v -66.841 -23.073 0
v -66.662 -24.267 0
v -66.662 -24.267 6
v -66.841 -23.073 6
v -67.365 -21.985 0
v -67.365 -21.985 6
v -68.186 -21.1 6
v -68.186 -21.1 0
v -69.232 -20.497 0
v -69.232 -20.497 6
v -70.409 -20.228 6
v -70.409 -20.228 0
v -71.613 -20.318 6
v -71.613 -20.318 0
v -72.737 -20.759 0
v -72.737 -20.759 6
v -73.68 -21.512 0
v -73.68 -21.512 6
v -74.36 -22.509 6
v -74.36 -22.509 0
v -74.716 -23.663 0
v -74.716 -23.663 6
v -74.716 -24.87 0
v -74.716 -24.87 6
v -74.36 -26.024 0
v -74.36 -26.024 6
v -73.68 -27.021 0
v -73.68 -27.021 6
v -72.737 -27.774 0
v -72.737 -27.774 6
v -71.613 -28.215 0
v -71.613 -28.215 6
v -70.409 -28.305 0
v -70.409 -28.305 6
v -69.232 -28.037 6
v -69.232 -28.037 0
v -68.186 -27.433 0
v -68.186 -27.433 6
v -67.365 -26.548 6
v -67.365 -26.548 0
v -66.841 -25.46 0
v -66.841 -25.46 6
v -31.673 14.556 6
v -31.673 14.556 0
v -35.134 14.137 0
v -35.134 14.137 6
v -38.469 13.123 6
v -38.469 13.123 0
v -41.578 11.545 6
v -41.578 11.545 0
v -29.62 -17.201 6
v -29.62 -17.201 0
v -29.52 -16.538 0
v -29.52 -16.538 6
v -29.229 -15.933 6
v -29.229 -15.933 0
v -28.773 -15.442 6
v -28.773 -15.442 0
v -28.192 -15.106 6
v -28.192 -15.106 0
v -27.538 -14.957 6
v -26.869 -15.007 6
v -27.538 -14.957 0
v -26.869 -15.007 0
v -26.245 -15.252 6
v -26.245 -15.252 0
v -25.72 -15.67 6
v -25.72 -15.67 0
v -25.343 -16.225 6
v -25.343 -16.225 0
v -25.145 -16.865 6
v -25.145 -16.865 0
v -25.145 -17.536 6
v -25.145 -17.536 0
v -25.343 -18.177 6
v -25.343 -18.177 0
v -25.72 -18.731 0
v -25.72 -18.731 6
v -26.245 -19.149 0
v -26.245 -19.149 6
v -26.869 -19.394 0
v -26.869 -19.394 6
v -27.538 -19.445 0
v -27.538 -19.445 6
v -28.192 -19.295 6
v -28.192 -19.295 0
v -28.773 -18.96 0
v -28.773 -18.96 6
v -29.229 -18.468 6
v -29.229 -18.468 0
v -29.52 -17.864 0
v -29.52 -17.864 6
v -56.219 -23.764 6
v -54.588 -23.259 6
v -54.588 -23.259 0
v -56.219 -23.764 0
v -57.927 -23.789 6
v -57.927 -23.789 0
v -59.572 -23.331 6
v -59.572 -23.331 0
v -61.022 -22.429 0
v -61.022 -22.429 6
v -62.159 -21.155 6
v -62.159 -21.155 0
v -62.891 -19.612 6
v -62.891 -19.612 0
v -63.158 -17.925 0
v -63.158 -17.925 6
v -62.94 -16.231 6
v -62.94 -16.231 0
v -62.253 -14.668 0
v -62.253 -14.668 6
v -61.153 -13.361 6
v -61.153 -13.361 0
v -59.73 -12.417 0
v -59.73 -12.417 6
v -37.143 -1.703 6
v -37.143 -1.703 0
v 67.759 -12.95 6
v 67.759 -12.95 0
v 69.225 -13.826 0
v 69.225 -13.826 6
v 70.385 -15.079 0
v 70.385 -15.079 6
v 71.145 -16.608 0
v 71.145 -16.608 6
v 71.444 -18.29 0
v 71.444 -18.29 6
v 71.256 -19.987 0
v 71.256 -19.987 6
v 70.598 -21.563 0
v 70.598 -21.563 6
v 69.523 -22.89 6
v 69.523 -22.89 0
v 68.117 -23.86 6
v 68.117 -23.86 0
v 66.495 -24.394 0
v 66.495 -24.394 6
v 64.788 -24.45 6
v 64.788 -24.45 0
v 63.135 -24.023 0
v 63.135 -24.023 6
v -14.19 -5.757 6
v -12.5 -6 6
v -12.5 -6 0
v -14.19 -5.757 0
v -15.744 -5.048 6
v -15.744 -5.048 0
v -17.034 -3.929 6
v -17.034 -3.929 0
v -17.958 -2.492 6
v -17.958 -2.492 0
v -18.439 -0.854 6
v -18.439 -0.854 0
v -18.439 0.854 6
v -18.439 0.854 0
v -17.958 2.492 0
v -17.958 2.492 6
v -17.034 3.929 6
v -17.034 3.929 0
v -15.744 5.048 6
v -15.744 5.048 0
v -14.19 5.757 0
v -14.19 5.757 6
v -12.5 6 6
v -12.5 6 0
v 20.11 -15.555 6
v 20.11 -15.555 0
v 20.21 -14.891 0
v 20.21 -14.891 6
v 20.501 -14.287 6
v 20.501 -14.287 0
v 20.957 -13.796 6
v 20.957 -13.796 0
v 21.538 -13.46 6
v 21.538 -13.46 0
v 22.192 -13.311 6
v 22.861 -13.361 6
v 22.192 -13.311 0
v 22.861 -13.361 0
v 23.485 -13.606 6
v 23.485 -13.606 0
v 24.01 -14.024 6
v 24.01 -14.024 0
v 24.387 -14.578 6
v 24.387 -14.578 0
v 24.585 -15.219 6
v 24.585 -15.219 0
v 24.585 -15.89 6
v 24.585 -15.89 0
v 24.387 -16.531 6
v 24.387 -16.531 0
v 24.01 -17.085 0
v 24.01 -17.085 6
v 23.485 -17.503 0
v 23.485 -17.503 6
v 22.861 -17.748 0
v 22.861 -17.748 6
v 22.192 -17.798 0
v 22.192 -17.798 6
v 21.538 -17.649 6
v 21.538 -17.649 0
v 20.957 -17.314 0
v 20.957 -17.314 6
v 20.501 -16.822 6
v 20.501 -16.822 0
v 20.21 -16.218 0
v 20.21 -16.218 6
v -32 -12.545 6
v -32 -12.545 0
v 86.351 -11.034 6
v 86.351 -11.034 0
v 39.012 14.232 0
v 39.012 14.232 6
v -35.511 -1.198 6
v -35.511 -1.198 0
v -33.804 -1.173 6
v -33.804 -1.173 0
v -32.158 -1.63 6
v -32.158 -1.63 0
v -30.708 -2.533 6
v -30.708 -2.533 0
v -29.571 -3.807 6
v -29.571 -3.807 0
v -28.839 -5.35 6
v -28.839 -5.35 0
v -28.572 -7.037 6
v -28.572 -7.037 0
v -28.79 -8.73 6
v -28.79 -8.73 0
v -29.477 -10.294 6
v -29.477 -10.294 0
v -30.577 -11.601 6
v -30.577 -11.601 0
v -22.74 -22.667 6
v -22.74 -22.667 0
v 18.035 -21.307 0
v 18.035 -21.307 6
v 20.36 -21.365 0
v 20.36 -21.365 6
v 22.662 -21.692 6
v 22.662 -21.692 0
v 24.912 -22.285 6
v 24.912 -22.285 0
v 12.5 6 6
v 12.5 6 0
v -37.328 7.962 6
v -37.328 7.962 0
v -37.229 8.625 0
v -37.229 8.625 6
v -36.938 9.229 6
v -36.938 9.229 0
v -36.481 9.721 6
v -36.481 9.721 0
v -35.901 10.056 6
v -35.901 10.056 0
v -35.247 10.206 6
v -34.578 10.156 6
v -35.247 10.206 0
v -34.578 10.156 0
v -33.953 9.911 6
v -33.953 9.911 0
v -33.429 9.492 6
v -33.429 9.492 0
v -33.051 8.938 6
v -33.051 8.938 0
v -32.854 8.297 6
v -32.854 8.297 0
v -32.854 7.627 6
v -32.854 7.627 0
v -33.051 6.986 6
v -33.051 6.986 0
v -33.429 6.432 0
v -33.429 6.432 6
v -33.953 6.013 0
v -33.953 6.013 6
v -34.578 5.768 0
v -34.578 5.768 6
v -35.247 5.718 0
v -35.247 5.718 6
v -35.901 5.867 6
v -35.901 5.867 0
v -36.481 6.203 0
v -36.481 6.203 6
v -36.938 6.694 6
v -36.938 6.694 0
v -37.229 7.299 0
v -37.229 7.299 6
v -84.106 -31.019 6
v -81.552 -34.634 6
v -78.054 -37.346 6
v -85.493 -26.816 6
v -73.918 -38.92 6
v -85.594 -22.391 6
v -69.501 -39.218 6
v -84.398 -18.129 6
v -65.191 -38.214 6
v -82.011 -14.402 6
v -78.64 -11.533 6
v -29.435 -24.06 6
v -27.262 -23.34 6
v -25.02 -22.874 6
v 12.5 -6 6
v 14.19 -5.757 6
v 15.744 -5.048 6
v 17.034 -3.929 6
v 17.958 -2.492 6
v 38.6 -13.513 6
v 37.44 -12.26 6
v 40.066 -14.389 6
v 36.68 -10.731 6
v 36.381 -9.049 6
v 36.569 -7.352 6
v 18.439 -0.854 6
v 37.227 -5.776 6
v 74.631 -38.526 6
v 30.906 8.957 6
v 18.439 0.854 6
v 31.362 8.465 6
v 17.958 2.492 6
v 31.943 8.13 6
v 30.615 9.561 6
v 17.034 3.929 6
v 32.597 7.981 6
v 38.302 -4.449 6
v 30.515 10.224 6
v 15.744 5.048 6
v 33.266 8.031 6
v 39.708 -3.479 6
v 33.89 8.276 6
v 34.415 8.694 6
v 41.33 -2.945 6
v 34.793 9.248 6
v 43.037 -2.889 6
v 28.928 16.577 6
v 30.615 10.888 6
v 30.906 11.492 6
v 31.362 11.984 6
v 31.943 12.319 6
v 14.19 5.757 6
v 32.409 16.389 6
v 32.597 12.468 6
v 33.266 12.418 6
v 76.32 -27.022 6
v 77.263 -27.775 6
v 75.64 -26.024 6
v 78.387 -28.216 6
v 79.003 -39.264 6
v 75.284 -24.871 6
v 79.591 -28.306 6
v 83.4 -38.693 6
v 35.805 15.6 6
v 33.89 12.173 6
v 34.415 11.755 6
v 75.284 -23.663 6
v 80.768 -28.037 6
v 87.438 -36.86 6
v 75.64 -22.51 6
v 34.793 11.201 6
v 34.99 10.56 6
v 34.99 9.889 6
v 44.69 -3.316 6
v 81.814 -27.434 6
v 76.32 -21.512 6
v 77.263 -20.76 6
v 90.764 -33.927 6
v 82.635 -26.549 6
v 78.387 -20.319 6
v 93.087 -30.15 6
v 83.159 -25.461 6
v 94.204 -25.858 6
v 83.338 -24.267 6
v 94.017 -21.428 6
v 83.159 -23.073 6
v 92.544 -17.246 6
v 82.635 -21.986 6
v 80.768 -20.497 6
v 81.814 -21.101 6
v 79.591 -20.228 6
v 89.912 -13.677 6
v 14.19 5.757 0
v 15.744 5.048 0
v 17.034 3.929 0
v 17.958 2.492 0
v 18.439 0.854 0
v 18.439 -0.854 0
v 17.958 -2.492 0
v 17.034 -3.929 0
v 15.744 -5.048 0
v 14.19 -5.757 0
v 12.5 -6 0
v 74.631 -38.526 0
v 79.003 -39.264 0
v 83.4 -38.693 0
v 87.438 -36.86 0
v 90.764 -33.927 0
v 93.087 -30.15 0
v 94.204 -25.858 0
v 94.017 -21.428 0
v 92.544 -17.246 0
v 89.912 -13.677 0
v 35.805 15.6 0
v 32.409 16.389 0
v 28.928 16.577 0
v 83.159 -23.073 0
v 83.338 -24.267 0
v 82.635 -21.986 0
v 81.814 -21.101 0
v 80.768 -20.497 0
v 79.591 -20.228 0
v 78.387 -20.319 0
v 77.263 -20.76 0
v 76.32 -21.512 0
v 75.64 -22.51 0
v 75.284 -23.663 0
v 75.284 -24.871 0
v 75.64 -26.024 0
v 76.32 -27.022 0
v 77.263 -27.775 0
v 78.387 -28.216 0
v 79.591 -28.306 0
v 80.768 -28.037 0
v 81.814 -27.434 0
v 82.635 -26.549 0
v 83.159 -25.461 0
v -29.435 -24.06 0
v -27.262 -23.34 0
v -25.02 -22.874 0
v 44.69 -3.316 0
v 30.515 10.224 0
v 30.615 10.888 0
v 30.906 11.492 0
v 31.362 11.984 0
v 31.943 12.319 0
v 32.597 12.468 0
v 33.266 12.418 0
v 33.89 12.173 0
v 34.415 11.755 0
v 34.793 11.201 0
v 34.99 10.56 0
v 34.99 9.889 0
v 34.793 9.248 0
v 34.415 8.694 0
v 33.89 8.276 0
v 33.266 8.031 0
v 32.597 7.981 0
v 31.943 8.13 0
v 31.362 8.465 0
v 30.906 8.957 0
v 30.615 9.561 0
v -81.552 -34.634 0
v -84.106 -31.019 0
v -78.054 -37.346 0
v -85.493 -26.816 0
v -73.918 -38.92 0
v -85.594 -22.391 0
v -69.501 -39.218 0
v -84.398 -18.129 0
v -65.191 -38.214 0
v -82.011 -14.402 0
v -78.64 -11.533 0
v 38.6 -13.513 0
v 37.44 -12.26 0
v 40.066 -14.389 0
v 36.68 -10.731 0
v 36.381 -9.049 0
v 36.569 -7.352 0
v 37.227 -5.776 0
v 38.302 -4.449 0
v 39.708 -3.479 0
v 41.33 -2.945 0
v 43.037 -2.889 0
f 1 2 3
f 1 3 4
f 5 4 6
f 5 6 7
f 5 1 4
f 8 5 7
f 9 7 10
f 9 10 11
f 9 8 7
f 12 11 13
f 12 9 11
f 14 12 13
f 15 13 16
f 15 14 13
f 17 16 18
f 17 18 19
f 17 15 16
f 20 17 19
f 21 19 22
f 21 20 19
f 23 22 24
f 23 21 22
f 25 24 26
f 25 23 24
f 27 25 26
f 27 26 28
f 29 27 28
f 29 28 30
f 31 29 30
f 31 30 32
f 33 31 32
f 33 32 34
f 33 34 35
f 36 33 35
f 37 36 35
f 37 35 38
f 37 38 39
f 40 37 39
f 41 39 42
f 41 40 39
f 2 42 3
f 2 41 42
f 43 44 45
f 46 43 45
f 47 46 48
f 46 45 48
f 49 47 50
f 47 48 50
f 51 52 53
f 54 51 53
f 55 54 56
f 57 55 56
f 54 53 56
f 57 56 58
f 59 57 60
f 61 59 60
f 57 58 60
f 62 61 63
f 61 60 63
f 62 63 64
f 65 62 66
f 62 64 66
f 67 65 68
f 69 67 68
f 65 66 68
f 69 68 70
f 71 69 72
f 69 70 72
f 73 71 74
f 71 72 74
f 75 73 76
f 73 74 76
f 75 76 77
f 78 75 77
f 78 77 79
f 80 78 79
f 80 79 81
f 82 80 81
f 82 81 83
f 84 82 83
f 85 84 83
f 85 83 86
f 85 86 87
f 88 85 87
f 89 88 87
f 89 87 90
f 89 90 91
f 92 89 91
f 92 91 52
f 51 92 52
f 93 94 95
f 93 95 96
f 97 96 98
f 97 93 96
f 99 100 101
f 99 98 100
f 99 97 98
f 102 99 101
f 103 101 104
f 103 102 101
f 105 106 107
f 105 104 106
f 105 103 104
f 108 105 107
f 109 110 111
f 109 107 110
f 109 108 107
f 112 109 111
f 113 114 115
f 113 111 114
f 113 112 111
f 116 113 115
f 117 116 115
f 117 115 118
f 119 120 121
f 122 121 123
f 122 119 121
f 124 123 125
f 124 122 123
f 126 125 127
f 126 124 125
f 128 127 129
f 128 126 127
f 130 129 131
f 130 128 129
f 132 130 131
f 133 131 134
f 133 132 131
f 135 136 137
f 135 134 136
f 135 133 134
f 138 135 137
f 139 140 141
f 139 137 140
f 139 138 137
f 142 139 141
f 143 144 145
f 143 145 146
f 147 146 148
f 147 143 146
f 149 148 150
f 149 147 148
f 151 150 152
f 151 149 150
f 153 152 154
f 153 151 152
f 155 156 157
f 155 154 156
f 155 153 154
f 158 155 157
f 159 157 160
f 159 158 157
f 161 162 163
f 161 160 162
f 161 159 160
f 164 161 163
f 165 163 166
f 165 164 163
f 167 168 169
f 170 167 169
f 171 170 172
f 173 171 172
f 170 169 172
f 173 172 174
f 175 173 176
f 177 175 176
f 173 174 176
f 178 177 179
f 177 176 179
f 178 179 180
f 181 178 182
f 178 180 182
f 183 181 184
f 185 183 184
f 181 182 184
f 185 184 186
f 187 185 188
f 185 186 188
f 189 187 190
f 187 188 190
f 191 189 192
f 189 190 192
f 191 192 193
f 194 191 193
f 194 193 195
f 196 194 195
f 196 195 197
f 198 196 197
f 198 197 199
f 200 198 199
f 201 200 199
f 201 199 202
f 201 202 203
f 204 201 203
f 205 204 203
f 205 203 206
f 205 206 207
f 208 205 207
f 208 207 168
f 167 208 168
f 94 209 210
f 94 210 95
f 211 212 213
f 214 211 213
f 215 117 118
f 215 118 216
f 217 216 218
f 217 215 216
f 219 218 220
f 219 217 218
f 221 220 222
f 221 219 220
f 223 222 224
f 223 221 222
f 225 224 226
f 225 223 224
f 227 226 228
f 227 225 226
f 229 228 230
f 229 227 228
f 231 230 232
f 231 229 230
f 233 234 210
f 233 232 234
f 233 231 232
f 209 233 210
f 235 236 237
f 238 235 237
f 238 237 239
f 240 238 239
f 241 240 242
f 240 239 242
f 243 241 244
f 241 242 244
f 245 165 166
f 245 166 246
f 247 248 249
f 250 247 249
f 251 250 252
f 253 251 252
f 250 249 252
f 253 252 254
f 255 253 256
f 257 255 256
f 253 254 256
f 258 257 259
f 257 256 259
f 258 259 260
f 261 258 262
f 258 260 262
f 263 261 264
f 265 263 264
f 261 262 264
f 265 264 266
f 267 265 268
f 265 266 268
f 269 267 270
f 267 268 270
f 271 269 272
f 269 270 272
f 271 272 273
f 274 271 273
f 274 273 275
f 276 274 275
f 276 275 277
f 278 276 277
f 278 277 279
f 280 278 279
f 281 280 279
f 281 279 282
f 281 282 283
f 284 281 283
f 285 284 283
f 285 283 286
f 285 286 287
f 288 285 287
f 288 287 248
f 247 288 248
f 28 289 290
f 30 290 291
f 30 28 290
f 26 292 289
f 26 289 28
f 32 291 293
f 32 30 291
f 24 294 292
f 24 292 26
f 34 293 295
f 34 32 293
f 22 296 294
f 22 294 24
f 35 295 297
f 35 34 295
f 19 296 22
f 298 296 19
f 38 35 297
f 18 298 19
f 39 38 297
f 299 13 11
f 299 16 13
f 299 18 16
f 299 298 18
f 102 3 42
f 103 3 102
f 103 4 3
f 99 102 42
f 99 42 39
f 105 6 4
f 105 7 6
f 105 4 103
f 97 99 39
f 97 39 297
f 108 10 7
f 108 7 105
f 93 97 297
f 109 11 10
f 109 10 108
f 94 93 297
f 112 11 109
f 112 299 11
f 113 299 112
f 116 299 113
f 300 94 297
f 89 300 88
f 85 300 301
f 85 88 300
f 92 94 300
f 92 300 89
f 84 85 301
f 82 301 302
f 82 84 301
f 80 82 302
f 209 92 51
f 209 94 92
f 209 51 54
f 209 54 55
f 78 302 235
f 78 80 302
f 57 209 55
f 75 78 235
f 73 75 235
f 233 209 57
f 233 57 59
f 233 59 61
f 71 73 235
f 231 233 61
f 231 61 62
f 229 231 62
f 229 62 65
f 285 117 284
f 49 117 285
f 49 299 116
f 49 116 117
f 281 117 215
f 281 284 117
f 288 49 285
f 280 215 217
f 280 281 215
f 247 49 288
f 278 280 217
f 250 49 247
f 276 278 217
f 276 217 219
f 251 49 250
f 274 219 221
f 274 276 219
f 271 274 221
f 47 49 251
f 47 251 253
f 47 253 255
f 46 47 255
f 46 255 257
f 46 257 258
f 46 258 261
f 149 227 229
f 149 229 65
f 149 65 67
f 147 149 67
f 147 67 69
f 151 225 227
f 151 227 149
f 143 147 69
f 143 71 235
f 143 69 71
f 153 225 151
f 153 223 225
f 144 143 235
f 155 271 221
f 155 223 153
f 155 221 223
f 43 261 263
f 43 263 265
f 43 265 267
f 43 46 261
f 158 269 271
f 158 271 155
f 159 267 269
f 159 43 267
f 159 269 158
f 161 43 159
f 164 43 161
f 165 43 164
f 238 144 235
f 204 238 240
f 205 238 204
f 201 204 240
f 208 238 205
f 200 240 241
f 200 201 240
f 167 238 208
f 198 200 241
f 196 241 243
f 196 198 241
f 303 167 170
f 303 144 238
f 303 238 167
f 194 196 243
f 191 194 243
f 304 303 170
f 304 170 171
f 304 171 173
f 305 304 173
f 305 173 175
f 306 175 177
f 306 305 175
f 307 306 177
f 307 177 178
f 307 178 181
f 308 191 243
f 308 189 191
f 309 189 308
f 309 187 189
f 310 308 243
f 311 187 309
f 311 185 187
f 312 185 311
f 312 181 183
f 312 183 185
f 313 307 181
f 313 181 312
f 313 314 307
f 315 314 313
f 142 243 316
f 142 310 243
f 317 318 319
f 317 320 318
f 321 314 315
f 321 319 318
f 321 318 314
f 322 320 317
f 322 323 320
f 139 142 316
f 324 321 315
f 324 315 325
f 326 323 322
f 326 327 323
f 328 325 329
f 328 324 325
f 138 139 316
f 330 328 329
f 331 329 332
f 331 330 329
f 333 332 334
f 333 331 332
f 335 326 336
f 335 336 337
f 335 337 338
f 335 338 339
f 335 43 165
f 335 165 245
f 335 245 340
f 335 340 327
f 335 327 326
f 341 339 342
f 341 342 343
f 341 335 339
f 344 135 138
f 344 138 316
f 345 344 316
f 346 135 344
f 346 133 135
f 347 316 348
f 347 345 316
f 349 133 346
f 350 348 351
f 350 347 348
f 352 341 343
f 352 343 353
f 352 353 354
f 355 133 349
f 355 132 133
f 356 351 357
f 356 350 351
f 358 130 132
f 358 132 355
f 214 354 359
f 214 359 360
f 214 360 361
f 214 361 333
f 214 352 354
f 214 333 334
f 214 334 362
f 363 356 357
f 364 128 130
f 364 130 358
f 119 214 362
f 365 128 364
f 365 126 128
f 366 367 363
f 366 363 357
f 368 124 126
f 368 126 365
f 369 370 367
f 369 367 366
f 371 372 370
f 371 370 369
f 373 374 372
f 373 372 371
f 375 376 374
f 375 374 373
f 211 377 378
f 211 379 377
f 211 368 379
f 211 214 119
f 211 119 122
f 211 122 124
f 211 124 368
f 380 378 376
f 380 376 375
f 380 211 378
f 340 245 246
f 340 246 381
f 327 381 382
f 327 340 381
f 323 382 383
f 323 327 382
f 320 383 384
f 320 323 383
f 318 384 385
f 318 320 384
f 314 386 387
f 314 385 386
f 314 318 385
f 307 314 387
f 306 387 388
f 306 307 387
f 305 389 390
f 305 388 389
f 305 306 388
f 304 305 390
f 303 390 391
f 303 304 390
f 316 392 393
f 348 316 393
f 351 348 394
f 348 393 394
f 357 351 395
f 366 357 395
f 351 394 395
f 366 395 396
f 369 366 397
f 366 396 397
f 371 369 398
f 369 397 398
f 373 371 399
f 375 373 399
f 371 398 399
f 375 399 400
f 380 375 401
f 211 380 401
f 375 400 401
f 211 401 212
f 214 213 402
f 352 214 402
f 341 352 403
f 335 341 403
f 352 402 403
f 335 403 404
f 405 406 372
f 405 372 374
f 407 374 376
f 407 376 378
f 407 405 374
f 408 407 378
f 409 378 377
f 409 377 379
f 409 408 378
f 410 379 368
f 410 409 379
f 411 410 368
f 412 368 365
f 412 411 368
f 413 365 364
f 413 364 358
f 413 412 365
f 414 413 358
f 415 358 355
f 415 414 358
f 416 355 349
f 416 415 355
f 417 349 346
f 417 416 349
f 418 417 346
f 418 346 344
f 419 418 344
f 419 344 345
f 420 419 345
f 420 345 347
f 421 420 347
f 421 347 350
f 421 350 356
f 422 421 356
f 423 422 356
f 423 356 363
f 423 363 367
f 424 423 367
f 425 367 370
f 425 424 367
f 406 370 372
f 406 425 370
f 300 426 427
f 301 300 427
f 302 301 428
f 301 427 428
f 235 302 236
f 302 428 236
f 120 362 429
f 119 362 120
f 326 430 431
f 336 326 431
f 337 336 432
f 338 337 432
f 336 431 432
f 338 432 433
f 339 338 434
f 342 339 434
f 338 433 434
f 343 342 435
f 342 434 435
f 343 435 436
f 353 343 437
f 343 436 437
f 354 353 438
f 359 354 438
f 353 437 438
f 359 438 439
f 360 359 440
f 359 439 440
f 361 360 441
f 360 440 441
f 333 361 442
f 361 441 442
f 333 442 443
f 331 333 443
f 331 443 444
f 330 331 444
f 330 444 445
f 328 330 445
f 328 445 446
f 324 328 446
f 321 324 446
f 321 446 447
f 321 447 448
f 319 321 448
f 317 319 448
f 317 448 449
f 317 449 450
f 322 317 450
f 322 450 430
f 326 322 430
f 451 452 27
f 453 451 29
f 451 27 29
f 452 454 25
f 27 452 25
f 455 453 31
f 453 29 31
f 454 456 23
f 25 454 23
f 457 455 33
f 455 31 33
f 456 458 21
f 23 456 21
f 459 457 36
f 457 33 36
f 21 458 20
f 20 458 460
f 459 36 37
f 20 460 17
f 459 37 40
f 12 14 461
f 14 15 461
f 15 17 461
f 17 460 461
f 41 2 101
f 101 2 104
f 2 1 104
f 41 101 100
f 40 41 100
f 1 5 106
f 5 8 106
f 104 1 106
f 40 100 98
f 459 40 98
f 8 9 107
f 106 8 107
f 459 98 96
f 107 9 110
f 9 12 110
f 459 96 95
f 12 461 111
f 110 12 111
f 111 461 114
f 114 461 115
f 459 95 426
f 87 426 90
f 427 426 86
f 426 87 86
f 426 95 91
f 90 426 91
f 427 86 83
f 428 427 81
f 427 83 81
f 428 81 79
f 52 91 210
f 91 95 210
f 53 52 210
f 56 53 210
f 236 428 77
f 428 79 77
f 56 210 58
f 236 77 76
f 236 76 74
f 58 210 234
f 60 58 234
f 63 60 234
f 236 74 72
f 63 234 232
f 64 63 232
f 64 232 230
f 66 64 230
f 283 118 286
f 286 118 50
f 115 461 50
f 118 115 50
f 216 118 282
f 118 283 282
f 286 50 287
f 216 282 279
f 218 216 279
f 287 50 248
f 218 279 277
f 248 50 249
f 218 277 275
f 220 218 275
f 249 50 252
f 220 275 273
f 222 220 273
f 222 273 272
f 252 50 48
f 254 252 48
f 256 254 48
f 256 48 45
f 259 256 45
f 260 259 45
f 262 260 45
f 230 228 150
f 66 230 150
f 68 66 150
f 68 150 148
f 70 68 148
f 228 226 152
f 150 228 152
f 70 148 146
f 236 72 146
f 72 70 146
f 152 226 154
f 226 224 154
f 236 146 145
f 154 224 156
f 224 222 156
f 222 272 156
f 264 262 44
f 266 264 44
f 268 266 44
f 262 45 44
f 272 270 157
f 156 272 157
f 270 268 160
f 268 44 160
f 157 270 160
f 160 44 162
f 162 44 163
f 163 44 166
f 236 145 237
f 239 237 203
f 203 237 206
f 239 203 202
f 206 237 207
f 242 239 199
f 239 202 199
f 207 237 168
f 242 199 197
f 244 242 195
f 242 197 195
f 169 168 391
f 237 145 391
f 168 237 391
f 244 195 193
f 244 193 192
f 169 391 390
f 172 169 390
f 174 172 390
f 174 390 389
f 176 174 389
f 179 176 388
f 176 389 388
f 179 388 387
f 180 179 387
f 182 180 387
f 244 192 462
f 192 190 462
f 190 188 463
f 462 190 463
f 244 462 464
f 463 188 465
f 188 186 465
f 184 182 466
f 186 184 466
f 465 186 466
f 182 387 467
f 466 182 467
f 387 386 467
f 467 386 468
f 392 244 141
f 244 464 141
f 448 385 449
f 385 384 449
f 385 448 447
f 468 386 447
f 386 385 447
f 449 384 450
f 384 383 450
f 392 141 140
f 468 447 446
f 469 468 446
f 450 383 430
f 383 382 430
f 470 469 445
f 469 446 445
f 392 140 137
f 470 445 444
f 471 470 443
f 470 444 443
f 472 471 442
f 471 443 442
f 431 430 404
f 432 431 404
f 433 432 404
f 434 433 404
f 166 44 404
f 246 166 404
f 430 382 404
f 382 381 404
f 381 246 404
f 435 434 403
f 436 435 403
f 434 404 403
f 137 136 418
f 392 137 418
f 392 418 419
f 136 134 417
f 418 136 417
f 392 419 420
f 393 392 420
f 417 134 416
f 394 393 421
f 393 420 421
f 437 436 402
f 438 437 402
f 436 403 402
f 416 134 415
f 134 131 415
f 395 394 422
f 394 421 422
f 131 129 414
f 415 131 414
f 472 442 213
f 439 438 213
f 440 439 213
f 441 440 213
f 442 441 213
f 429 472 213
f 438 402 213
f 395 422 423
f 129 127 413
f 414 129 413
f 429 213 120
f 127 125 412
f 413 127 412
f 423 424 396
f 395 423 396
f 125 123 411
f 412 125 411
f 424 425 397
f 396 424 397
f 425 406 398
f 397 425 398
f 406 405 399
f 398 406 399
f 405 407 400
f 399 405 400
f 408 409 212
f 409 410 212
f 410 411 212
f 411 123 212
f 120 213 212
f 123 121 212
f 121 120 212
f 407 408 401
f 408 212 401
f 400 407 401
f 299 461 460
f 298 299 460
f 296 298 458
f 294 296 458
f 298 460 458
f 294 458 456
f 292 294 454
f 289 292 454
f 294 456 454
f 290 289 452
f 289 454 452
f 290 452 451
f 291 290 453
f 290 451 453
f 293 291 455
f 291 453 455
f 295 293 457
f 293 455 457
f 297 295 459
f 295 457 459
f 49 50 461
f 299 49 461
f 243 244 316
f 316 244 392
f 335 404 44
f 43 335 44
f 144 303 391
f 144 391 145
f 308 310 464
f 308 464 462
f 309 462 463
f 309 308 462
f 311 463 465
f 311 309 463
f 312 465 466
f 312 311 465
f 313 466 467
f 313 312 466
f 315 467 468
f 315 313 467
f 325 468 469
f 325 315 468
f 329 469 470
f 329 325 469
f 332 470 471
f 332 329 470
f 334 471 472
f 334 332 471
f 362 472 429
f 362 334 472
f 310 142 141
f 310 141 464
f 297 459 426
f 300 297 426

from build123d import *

# Parameters (mm, degrees)
SKETCH1_R                = 4.05
BOSS_EXTRUDE1_DEPTH      = 6
M4_CLEARANCE_HOLE1_D     = 4.5
M4_CLEARANCE_HOLE1_DEPTH = 80.96
M4_CLEARANCE_HOLE1_TIP   = 1.351936393
CUT_EXTRUDE1_DEPTH       = 103.314309644


with BuildPart() as part:
    # Sketch1 → Boss-Extrude1 (new body)
    with BuildSketch(Plane.XY):
        with BuildLine():
            Line((-65.19060966, -38.213571923), (-29.435009511, -24.059676563))
            ThreePointArc((-29.435009511, -24.059676563), (-26.147647316, -23.075006142), (-22.740346385, -22.666807174))
            Line((-22.740346385, -22.666807174), (18.034765948, -21.307032913))
            ThreePointArc((18.034765948, -21.307032913), (21.515927007, -21.494956503), (24.911568818, -22.284522385))
            Line((24.911568818, -22.284522385), (74.630790843, -38.525664943))
            ThreePointArc((74.630790843, -38.525664943), (93.086798158, -30.149764409), (86.35131748, -11.033979941))
            Line((86.35131748, -11.033979941), (39.011755224, 14.232375332))
            ThreePointArc((39.011755224, 14.232375332), (34.124223209, 16.06850435), (28.928004649, 16.57708242))
            Line((28.928004649, 16.57708242), (-31.672918815, 14.556154182))
            ThreePointArc((-31.672918815, 14.556154182), (-36.823710211, 13.702522548), (-41.578056522, 11.544854797))
            Line((-41.578056522, 11.544854797), (-78.64034873, -11.533366082))
            ThreePointArc((-78.64034873, -11.533366082), (-84.105870489, -31.018758249), (-65.19060966, -38.213571923))
        make_face()
        with Locations((-70.711551227, -24.266557754)):
            Circle(SKETCH1_R, mode=Mode.SUBTRACT)
        with Locations((79.288448772, -24.267115836)):
            Circle(SKETCH1_R, mode=Mode.SUBTRACT)
    extrude(amount=BOSS_EXTRUDE1_DEPTH)

    # M4 Clearance Hole1
    with Locations(Plane(origin=(-35.078495103, 7.961945554, 6), x_dir=(1, 0, 0), z_dir=(0, 0, 1))):
        with Locations((0, 0), (7.708679818, -25.162744902), (67.843830433, 2.262465733), (57.438792738, -23.51661265)):
            Hole(M4_CLEARANCE_HOLE1_D / 2, depth=M4_CLEARANCE_HOLE1_DEPTH)
            with Locations((0, 0, -(M4_CLEARANCE_HOLE1_DEPTH + M4_CLEARANCE_HOLE1_TIP / 2))):  # 118° drill point
                Cone(0, M4_CLEARANCE_HOLE1_D / 2, M4_CLEARANCE_HOLE1_TIP, mode=Mode.SUBTRACT)

    # Sketch4 → Cut-Extrude1 (cut, through all)
    with BuildSketch(Plane.XY.offset(6)):
        with BuildLine():
            Line((-59.730356843, -12.416942996), (-37.142655282, -1.702665692))
            ThreePointArc((-37.142655282, -1.702665692), (-29.150180354, -4.552287513), (-31.999802176, -12.544762441))
            Line((-31.999802176, -12.544762441), (-54.587503737, -23.259039746))
            ThreePointArc((-54.587503737, -23.259039746), (-62.579978665, -20.409417924), (-59.730356843, -12.416942996))
        make_face()
        with BuildLine():
            Line((63.134796659, -24.023141646), (40.065741433, -14.388895905))
            ThreePointArc((40.065741433, -14.388895905), (36.841387157, -6.540103673), (44.690179389, -3.315749397))
            Line((44.690179389, -3.315749397), (67.759234614, -12.949995138))
            ThreePointArc((67.759234614, -12.949995138), (70.983588891, -20.79878737), (63.134796659, -24.023141646))
        make_face()
        with BuildLine():
            Line((-12.5, 6), (12.5, 6))
            ThreePointArc((12.5, 6), (18.5, 0), (12.5, -6))
            Line((12.5, -6), (-12.5, -6))
            ThreePointArc((-12.5, -6), (-18.5, 0), (-12.5, 6))
        make_face()
    extrude(amount=-CUT_EXTRUDE1_DEPTH, mode=Mode.SUBTRACT)


solid = part.part
